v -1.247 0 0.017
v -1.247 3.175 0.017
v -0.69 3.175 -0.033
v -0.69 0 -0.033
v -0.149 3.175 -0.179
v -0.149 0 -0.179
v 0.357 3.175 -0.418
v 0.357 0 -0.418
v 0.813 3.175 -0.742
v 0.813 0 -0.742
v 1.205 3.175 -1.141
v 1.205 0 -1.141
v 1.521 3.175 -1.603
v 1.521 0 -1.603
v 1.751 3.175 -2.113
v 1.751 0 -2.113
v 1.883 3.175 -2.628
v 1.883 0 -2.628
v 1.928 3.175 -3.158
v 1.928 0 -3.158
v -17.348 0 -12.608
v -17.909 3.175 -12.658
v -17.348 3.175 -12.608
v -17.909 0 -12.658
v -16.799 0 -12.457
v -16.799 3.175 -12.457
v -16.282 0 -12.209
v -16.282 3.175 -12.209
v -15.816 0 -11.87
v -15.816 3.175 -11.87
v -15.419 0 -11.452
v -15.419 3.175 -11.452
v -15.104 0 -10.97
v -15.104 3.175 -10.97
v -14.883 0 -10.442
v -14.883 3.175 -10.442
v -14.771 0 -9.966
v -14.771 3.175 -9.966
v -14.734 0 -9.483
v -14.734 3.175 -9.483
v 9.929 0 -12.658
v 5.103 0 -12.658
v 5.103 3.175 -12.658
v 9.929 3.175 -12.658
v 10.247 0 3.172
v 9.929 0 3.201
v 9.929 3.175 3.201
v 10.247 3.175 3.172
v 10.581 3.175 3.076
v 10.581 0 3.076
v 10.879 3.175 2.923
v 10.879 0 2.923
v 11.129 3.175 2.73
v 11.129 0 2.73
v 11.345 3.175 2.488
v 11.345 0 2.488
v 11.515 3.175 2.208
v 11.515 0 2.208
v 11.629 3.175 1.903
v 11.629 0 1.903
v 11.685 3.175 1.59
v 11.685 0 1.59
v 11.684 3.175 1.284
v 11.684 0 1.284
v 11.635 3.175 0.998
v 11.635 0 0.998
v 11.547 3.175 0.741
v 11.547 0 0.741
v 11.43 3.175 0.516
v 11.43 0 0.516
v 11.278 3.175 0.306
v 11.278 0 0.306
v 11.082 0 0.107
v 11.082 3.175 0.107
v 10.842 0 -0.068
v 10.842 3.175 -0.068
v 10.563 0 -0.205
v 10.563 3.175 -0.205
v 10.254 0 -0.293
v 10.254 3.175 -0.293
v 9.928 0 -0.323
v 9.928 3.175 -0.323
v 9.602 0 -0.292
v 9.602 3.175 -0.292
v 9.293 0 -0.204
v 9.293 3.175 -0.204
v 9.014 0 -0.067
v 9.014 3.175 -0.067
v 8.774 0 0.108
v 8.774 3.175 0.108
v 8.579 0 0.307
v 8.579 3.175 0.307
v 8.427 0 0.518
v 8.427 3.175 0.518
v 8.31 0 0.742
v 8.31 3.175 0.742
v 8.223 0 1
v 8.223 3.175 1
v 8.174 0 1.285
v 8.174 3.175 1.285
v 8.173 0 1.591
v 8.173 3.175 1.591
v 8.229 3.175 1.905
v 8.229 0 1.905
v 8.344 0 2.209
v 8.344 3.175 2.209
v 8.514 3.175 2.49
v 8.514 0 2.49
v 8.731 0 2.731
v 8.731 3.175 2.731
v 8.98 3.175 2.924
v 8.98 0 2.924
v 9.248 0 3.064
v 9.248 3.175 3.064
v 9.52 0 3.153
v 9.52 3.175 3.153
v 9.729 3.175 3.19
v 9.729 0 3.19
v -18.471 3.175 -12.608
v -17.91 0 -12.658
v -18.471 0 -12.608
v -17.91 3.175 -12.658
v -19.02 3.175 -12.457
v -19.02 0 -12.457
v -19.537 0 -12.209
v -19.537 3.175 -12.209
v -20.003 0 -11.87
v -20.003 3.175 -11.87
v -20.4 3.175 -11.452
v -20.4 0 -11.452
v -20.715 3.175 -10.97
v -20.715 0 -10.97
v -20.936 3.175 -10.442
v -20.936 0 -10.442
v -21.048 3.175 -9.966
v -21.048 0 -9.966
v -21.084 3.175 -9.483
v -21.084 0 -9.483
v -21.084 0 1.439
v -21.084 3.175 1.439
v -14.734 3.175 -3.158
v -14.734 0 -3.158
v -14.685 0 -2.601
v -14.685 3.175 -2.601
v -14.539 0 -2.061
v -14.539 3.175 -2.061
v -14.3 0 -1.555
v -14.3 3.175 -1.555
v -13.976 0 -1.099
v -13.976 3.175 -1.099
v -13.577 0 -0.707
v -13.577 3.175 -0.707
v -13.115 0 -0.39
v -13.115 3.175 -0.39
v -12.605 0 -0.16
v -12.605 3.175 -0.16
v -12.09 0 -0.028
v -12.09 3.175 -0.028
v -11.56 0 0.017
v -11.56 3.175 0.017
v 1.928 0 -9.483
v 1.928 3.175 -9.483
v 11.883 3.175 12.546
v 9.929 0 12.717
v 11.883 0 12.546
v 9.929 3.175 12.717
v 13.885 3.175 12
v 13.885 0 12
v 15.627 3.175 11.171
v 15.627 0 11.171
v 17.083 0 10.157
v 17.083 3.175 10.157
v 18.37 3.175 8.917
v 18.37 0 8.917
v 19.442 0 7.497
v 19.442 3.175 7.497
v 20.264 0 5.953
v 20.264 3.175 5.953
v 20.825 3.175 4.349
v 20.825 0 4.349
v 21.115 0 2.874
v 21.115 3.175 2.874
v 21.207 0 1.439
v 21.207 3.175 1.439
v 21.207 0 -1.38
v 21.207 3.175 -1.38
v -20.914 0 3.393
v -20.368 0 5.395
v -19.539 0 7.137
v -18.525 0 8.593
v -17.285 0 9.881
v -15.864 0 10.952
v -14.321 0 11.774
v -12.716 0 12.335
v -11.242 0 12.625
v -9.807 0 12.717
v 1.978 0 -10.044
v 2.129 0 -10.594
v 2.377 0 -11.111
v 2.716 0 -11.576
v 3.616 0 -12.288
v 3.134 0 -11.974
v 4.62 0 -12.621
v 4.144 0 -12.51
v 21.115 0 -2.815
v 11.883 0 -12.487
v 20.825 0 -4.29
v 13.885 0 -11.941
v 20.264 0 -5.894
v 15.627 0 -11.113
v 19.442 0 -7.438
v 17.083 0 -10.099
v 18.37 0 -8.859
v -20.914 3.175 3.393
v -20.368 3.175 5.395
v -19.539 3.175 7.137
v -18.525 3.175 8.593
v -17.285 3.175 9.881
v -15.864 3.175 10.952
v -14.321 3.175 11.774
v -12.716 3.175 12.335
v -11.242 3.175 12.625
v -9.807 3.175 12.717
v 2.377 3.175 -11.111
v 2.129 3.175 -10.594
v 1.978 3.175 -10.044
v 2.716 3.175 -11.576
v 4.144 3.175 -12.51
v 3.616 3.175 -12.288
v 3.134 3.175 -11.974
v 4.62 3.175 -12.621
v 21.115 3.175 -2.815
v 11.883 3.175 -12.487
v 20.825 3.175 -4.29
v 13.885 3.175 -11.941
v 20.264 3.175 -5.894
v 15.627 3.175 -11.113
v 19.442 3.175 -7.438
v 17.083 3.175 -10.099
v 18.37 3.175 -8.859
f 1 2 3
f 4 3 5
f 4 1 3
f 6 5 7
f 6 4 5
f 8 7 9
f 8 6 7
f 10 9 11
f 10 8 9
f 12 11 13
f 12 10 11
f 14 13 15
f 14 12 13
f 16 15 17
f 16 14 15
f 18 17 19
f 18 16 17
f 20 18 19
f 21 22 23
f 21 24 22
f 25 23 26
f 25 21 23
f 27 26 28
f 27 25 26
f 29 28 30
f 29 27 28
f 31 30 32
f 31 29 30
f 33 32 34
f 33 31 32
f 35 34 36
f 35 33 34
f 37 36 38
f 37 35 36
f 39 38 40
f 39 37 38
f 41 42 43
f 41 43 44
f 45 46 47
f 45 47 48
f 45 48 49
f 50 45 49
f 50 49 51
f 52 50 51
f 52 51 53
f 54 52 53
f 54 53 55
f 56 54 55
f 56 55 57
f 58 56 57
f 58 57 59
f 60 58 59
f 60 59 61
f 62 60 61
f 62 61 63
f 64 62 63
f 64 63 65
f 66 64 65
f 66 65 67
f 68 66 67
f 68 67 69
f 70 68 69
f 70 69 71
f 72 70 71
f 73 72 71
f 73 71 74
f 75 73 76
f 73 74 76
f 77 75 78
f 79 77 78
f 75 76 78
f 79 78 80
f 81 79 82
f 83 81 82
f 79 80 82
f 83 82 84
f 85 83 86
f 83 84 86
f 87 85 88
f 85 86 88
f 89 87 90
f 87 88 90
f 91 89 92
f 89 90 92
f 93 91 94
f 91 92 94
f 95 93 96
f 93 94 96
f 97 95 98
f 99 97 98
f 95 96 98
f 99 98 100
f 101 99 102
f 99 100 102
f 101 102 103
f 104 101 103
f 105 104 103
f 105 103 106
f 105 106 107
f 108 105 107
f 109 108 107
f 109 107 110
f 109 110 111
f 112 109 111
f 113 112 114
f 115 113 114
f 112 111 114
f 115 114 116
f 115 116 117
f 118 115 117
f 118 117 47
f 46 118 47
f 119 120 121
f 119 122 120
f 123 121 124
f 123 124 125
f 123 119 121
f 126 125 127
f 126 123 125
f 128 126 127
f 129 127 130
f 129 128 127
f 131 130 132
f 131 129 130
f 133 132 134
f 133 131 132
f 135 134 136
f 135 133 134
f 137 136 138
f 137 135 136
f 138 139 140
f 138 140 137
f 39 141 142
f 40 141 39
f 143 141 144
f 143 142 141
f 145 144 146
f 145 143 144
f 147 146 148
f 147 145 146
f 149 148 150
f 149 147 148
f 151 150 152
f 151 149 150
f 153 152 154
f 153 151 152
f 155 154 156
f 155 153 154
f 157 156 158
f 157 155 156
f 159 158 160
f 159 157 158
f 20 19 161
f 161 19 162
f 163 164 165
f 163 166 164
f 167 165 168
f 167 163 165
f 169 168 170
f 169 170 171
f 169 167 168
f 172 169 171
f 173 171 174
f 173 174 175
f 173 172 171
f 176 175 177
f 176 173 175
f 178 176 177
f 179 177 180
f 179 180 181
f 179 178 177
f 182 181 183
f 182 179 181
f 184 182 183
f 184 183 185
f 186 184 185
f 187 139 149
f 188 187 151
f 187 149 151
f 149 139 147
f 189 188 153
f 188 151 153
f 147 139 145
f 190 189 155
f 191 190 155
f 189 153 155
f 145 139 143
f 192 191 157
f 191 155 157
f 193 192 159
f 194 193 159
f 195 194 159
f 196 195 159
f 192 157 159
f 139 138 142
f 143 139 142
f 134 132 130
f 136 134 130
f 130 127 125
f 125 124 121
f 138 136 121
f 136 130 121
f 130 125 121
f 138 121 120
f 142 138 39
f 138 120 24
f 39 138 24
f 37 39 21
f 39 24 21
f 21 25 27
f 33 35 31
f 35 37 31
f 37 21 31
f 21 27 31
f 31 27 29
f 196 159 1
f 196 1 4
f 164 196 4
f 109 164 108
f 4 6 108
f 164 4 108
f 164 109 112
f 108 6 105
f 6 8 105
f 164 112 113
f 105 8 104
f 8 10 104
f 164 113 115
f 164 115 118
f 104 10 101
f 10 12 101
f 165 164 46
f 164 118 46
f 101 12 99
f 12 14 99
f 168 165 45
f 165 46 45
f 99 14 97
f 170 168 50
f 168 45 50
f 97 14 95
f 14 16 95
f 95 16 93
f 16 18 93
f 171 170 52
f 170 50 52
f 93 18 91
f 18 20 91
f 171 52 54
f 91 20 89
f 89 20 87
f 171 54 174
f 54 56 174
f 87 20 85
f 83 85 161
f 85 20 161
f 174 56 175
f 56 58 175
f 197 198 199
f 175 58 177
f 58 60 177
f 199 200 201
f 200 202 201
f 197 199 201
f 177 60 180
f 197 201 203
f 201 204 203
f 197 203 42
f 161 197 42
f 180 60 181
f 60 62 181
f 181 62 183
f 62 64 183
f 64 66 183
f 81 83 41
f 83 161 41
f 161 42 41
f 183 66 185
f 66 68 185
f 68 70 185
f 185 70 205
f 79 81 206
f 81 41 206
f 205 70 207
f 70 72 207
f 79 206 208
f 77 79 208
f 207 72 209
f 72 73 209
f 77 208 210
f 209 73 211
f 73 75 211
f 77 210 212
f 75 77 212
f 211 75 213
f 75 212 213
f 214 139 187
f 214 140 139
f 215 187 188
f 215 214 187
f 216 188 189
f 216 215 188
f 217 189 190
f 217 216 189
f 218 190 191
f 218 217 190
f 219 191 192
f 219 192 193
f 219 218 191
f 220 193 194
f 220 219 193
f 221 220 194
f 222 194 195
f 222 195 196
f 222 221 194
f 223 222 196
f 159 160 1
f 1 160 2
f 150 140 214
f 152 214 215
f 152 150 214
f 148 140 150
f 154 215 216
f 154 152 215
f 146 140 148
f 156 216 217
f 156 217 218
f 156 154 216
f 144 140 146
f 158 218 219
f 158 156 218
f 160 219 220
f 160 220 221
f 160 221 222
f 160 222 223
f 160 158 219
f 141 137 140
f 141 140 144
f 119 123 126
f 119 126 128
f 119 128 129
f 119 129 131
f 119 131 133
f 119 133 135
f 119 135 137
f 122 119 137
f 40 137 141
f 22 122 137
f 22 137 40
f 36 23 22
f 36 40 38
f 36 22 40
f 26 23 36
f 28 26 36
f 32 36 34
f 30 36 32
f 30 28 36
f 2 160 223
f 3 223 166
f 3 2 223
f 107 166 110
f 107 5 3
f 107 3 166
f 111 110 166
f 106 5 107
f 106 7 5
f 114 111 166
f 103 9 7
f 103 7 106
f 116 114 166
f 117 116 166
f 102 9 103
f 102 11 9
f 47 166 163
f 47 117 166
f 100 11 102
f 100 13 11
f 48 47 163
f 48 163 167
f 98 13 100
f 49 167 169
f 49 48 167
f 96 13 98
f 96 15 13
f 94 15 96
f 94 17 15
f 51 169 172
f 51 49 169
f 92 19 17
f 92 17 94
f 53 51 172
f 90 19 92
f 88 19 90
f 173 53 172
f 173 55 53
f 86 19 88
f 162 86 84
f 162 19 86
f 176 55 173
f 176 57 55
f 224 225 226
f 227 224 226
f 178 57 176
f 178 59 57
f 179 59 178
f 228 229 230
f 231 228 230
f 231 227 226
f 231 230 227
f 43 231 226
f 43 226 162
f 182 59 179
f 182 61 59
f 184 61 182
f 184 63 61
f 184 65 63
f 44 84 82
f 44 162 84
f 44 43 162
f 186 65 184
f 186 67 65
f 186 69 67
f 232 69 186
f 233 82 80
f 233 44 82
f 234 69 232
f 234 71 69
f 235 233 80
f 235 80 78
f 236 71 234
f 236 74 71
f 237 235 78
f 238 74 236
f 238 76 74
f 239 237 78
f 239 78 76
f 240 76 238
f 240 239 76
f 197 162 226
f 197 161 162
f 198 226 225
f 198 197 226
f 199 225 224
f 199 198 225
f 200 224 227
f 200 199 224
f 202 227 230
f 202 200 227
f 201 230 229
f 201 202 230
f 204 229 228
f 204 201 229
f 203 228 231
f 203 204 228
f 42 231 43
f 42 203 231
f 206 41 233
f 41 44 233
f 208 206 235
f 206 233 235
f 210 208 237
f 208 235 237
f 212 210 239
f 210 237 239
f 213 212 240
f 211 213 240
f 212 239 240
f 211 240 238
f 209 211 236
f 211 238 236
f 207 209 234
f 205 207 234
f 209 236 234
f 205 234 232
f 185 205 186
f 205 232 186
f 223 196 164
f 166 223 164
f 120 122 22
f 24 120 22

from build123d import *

# Parameters (mm, degrees)
SKETCH1_W           = 38.1
SKETCH1_H           = 22.86
BOSS_EXTRUDE1_DEPTH = 3.175
FILLET1_R           = 10.16
SKETCH3_R           = 1.5875
CUT_EXTRUDE1_DEPTH  = 23.44165825
FILLET3_R           = 10.16
SCALE1_SCALE_X      = 1.11
SCALE1_SCALE_Y      = 1
SCALE1_SCALE_Z      = 1.11
SKETCH4_W           = 16.66240239
SKETCH4_H           = 12.6746
CUT_EXTRUDE2_DEPTH  = 25.930165729
FILLET7_R           = 3.175


with BuildPart() as part:
    # Sketch1 → Boss-Extrude1 (new body)
    with BuildSketch(Plane(origin=(0, 0, 0), x_dir=(1, 0, 0), z_dir=(0, 1, 0))):
        Rectangle(SKETCH1_W, SKETCH1_H)
    extrude(amount=BOSS_EXTRUDE1_DEPTH)

    # Fillet1
    fillet1_edges = [part.edges().sort_by_distance(p)[0] for p in [
        (19.05, 1.5875, 11.43),
        (-19.05, 1.5875, 11.43),
    ]]
    fillet(fillet1_edges, radius=FILLET1_R)

    # Sketch3 → Cut-Extrude1 (cut, through all)
    with BuildSketch(Plane(origin=(0, 3.175, 0), x_dir=(1, 0, 0), z_dir=(0, 1, 0))):
        with Locations(Location((8.89, -1.27, 0), (0, 0, 270))):
            Circle(SKETCH3_R)
    extrude(amount=-CUT_EXTRUDE1_DEPTH, mode=Mode.SUBTRACT)

    # Fillet3
    fillet3_edges = [part.edges().sort_by_distance(p)[0] for p in [
        (19.05, 1.5875, -11.43),
    ]]
    fillet(fillet3_edges, radius=FILLET3_R)


with BuildPart() as part_1:
    # Scale1: scaled about (-0.555008507, 1.5875, -0.267369012)
    add(part.part.scale((SCALE1_SCALE_X, SCALE1_SCALE_Y, SCALE1_SCALE_Z), about=(-0.555008507, 1.5875, -0.267369012)))

    # Sketch4 → Cut-Extrude2 (cut, through all)
    with BuildSketch(Plane(origin=(0, 3.175, 0), x_dir=(1, 0, 0), z_dir=(0, 1, 0))):
        with Locations((-6.403247869, 6.320589409)):
            Rectangle(SKETCH4_W, SKETCH4_H)
    extrude(amount=-CUT_EXTRUDE2_DEPTH, mode=Mode.SUBTRACT)

    # Fillet7
    fillet7_edges = [part_1.edges().sort_by_distance(p)[0] for p in [
        (-14.734449064, 1.5875, 0.016710591),
        (-14.734449064, 1.5875, -12.657889409),
        (1.927953326, 1.5875, -12.657889409),
        (1.927953326, 1.5875, 0.016710591),
        (-21.084449064, 1.5875, -12.657889409),
    ]]
    fillet(fillet7_edges, radius=FILLET7_R - 0.0001)  # a hair under: the kernel refuses the full size


solid = part_1.part
